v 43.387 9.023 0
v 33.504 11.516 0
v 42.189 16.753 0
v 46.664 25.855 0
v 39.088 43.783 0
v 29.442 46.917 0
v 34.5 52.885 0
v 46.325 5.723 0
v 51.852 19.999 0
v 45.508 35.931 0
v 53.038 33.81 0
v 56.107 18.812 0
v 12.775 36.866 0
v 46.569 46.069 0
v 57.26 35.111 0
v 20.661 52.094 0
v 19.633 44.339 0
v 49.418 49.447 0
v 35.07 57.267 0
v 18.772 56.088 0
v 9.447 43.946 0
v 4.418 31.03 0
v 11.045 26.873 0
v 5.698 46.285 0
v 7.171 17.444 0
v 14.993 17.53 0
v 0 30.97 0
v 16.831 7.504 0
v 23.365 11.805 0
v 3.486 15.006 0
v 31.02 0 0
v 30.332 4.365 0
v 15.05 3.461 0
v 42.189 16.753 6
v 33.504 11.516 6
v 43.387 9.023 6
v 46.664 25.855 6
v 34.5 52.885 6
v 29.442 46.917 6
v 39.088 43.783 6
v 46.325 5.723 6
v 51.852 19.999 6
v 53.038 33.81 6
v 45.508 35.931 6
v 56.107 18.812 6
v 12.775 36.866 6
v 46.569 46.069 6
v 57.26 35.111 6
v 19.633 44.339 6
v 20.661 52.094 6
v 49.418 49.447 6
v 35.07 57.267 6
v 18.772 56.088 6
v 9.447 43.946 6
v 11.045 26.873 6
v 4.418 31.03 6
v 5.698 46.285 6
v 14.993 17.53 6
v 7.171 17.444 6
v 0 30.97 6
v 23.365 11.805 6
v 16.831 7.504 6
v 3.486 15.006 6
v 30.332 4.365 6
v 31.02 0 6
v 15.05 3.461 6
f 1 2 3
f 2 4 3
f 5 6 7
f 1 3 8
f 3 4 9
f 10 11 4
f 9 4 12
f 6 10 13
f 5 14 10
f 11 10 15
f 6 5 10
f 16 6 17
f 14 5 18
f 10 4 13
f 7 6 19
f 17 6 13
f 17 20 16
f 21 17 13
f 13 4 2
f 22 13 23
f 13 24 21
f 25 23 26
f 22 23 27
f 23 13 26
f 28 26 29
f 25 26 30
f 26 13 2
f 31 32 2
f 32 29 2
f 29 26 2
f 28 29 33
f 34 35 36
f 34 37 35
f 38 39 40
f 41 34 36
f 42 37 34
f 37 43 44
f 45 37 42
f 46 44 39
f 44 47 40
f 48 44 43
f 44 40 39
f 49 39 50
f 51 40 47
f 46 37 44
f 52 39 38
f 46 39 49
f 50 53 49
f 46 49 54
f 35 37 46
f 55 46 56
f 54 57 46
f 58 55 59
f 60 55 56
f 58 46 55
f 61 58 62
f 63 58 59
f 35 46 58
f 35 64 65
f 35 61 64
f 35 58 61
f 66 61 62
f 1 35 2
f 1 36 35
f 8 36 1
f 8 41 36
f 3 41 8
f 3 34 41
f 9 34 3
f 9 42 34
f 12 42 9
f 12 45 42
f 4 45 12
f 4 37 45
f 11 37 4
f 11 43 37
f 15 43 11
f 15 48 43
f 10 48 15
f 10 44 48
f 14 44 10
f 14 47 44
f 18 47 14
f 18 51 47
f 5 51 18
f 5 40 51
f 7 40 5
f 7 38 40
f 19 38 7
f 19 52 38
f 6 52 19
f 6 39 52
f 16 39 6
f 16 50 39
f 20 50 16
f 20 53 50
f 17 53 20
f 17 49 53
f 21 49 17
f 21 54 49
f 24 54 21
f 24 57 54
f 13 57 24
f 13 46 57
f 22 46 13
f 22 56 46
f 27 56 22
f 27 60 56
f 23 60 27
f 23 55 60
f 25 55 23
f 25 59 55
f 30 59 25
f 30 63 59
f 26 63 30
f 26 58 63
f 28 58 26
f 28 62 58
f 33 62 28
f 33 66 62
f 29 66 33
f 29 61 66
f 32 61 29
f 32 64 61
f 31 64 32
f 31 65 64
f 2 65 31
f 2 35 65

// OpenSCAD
$fn = 32;

// ----------------------------------------------------------------------
// Fan rotor section: 11 blades, 18 mm hub radius, 11 mm blades
// ----------------------------------------------------------------------

// --- parameters (mm) ---
profile_height = 6;       // extrusion height
profile_points = 33;      // points of the closed outline

profile = [[46.664, 25.855], [53.038, 33.81], [57.26, 35.111], [45.508, 35.931], [46.569, 46.069], [49.418, 49.447], [39.088, 43.783], [34.5, 52.885], [35.07, 57.267], [29.442, 46.917], [20.661, 52.094], [18.772, 56.088], [19.633, 44.339], [9.447, 43.946], [5.698, 46.285], [12.775, 36.866], [4.418, 31.03], [0, 30.97], [11.045, 26.873], [7.171, 17.444], [3.486, 15.006], [14.993, 17.53], [16.831, 7.504], [15.05, 3.461], [23.365, 11.805], [30.332, 4.365], [31.02, 0], [33.504, 11.516], [43.387, 9.023], [46.325, 5.723], [42.189, 16.753], [51.852, 19.999], [56.107, 18.812]];  // single closed polygon, 33 points, counter clockwise

// --- the one profile operation ---
linear_extrude(height = profile_height) polygon(points = profile);
